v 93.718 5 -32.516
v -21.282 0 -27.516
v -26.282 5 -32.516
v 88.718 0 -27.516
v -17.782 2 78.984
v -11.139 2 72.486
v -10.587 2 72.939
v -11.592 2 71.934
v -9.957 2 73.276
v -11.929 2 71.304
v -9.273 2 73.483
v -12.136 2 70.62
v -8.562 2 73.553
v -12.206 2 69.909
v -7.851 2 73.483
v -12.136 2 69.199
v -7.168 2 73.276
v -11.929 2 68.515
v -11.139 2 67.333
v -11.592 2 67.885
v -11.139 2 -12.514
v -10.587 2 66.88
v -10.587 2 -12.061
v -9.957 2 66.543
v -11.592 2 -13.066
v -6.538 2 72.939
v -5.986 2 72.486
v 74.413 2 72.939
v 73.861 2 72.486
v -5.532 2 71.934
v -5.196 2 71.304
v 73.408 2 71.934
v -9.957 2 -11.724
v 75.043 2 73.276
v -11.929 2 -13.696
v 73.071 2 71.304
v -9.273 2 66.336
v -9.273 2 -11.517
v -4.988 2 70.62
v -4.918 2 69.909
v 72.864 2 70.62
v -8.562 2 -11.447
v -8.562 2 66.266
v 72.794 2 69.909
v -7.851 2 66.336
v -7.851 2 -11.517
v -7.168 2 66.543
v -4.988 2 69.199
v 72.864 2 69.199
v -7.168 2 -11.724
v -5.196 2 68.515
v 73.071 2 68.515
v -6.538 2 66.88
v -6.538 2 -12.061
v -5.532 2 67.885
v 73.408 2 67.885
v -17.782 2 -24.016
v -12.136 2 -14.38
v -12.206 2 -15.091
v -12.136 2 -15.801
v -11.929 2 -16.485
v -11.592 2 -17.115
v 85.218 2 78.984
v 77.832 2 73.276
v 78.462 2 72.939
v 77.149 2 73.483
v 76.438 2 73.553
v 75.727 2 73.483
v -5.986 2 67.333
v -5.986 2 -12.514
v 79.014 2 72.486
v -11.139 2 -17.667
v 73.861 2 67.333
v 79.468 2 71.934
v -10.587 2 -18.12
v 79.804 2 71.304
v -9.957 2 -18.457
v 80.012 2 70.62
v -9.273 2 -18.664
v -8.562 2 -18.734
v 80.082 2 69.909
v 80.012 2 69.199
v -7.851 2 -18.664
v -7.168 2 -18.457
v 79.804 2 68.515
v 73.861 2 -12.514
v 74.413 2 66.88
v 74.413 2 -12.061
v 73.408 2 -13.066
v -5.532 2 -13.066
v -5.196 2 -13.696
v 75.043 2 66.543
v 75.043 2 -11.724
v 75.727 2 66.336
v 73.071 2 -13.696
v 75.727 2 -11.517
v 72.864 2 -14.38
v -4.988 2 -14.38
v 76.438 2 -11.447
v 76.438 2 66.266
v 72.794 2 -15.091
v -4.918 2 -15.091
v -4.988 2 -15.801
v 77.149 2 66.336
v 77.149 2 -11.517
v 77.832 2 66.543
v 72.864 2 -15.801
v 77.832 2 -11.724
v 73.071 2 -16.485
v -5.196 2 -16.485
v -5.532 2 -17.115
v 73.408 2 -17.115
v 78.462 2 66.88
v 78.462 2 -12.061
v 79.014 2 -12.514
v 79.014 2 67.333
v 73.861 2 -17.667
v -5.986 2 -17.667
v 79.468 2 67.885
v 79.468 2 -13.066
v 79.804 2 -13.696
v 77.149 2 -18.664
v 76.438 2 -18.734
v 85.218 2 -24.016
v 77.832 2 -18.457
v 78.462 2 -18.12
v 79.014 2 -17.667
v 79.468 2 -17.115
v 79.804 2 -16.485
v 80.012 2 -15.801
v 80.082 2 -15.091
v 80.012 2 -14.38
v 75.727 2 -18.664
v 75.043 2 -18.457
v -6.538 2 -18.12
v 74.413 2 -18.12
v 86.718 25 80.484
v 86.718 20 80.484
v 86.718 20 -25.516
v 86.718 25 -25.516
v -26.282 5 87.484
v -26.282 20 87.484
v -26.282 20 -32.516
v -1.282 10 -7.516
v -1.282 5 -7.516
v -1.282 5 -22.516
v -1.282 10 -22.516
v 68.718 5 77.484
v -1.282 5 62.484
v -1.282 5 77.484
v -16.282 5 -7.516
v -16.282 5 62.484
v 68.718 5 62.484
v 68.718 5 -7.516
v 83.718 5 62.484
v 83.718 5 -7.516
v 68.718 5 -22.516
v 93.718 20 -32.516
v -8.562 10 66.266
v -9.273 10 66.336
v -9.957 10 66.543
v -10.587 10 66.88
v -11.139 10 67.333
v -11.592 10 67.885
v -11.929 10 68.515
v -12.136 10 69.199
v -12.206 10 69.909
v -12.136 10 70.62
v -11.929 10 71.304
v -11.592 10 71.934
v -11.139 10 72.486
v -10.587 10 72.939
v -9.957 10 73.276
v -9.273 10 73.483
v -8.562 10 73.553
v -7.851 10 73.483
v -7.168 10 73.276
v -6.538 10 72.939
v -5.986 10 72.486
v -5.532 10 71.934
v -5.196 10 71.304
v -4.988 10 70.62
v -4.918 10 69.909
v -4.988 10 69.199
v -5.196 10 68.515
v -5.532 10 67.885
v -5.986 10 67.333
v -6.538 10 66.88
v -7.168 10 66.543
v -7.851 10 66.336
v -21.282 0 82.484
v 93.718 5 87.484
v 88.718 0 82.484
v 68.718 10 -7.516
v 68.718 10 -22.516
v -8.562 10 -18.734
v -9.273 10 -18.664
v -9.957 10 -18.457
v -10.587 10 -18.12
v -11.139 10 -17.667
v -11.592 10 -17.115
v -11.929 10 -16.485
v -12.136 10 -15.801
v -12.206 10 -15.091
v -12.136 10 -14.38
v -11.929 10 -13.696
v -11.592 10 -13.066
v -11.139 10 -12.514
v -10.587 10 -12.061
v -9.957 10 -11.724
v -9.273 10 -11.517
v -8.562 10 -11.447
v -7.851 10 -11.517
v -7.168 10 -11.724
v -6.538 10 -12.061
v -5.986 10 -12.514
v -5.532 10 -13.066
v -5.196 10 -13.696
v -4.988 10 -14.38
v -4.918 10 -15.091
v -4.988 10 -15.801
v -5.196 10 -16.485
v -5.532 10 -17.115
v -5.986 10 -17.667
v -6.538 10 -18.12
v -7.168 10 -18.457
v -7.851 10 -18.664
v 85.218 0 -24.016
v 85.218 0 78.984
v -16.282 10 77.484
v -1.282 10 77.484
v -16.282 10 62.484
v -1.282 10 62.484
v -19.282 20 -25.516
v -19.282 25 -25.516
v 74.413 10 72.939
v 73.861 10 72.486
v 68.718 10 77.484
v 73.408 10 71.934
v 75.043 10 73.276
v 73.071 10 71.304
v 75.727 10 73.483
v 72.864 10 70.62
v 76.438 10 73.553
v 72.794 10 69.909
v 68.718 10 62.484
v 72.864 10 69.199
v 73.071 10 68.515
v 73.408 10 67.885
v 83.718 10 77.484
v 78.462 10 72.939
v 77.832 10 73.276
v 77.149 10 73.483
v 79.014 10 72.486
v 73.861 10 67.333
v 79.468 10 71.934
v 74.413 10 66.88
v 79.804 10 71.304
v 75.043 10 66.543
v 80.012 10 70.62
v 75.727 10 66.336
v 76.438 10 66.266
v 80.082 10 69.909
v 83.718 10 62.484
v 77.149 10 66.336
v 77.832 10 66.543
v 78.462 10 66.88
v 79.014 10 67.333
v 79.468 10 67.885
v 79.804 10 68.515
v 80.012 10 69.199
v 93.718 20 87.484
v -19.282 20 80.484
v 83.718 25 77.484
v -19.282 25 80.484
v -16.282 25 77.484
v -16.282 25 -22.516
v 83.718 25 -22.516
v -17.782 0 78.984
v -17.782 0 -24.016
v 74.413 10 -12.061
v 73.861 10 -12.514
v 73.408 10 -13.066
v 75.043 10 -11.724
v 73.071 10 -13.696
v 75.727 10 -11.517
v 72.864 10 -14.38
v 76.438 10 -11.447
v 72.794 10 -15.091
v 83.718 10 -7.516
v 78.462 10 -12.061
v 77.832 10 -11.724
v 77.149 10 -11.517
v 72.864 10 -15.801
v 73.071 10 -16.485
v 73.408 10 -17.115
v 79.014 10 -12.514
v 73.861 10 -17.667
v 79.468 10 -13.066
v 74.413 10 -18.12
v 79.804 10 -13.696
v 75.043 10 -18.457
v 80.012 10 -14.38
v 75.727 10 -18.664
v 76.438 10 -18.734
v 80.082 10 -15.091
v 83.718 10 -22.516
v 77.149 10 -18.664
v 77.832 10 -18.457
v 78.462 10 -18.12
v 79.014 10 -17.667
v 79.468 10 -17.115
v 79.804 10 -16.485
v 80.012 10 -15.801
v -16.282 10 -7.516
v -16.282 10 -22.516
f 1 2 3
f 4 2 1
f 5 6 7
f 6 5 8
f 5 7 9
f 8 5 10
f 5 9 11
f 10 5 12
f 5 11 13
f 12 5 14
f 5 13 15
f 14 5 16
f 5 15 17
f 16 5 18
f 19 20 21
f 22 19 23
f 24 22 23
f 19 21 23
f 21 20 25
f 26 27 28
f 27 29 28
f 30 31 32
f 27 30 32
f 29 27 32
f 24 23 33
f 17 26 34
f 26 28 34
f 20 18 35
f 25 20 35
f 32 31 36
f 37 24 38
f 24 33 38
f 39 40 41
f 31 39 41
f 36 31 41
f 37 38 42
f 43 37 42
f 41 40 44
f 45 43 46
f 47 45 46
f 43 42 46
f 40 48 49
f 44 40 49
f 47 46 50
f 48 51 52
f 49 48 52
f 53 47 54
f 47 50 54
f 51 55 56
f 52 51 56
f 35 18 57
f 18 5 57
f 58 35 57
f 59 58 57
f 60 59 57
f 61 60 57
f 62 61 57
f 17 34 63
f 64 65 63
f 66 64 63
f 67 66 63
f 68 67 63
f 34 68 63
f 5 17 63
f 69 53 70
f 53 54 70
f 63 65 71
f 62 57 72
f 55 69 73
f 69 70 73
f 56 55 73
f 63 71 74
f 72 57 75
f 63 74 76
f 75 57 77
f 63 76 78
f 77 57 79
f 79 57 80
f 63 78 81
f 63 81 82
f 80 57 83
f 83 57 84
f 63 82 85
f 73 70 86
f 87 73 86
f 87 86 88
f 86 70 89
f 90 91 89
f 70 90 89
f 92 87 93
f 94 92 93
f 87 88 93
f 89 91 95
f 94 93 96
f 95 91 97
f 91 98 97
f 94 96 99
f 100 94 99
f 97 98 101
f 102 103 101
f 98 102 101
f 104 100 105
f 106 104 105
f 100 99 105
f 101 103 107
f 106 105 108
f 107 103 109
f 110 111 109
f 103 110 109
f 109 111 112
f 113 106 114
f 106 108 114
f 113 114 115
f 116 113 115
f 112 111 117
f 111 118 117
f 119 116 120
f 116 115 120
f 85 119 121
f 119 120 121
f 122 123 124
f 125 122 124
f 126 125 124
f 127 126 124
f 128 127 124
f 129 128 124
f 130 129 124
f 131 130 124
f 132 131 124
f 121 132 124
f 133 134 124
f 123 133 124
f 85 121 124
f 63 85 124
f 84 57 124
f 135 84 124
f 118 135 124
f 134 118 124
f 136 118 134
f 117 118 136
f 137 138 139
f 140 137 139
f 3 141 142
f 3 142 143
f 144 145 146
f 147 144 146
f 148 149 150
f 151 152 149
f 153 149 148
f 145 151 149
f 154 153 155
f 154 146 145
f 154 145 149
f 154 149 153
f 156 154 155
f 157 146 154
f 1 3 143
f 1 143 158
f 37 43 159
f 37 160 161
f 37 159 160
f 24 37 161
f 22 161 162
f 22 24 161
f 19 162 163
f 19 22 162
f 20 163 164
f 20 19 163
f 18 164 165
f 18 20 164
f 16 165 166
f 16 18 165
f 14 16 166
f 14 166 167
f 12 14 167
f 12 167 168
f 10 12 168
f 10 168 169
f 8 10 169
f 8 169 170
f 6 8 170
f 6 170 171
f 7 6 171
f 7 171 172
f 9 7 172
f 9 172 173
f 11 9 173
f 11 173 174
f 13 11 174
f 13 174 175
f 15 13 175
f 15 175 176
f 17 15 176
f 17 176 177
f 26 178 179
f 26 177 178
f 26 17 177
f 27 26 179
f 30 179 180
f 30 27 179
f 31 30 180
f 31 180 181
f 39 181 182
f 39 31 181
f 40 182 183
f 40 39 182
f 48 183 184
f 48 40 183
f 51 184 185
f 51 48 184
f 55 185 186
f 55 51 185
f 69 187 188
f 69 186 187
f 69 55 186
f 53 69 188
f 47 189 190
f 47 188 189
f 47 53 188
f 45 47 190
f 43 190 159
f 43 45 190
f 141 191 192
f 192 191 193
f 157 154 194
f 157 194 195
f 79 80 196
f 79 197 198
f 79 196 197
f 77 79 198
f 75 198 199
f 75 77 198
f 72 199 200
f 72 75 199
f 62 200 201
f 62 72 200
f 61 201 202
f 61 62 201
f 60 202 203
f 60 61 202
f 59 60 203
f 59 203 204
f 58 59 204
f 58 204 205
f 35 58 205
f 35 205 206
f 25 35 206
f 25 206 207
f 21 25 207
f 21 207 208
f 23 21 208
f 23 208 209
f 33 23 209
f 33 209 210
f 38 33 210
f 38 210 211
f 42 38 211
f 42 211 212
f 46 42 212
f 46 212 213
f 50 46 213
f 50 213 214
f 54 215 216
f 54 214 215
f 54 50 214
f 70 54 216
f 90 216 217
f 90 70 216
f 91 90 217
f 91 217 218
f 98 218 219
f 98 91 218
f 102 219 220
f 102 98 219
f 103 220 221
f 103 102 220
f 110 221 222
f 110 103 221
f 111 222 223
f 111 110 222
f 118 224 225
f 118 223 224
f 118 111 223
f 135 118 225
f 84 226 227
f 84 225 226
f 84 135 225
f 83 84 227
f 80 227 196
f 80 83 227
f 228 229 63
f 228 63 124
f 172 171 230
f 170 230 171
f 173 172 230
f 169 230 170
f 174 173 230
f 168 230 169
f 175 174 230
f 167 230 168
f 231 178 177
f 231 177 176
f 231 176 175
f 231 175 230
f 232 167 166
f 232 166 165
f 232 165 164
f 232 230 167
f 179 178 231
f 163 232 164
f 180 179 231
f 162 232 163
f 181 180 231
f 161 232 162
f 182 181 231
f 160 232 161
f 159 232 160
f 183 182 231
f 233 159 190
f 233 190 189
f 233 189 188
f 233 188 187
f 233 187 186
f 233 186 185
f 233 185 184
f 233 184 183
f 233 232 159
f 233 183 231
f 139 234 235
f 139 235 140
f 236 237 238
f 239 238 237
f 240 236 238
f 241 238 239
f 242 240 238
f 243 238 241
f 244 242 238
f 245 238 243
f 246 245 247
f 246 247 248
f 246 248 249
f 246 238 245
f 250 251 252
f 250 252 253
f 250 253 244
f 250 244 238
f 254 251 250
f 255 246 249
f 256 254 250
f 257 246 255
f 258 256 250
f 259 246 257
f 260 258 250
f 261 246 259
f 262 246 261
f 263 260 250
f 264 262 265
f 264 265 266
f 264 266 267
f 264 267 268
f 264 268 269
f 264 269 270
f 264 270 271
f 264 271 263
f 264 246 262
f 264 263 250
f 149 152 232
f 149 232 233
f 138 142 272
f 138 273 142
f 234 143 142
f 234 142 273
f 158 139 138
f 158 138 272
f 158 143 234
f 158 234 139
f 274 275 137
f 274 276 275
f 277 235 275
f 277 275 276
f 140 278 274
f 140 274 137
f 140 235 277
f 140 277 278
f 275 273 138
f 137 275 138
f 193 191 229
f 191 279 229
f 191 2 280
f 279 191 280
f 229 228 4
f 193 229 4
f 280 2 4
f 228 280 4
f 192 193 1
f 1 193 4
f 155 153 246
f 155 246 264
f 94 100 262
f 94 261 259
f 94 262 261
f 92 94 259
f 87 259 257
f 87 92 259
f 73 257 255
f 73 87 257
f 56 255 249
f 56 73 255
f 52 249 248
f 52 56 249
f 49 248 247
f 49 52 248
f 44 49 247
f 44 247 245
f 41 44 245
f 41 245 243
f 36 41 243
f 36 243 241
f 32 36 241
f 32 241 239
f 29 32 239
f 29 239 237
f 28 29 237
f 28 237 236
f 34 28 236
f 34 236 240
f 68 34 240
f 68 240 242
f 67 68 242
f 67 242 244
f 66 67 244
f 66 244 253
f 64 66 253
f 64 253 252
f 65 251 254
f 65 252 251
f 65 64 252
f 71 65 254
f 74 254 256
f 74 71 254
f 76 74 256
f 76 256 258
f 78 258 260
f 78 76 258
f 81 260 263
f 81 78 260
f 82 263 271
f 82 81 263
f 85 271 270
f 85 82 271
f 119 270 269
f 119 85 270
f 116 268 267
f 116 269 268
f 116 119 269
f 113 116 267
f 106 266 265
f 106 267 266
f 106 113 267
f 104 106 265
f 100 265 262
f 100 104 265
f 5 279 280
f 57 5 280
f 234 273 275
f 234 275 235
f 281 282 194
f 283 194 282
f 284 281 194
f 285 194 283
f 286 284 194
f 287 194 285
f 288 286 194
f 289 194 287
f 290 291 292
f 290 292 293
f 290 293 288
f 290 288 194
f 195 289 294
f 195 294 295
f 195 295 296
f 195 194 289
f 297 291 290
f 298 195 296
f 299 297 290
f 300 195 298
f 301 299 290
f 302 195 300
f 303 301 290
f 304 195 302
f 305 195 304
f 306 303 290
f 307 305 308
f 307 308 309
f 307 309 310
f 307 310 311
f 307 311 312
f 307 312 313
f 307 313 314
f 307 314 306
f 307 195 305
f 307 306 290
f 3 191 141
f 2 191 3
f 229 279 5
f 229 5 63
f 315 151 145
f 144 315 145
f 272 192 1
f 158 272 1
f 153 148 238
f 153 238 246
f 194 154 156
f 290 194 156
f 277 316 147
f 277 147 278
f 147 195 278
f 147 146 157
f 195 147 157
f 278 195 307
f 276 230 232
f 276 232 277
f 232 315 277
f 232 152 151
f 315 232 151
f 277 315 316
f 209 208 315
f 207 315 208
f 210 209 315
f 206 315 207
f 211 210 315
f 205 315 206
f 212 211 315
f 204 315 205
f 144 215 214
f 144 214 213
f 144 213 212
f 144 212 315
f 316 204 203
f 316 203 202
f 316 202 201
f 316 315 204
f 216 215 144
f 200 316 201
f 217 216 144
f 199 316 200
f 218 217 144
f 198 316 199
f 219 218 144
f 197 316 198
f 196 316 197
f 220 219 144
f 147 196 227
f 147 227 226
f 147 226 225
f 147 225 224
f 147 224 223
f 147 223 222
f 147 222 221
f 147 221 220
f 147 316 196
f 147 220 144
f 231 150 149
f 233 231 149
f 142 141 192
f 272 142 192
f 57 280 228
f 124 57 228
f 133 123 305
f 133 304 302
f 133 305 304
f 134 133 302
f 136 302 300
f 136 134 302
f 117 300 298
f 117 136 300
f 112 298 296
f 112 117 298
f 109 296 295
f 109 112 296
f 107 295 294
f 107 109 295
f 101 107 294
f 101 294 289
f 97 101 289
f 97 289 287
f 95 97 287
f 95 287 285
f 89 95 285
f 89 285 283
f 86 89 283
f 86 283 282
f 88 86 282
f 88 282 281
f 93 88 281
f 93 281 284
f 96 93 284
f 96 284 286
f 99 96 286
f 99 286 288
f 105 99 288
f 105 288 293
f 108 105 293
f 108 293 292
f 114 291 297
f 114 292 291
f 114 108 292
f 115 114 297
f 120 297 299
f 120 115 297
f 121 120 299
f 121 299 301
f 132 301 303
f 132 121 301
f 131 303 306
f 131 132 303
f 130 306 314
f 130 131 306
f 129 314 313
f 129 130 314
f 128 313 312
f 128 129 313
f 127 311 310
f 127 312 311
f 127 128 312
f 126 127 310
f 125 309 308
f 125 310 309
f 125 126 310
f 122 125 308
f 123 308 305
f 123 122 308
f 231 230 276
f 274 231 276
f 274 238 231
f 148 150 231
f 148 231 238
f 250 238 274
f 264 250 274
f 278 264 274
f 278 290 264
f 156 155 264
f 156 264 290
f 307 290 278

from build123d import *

# Parameters (mm, degrees)
SKETCH1_W               = 120
SKETCH1_H               = 120
SKETCH1_W_2             = 106
SKETCH1_H_2             = 106
BOSS_EXTRUDE1_DEPTH     = 20
SKETCH1_4_W             = 106
SKETCH1_4_H             = 106
SKETCH1_4_W_2           = 100
SKETCH1_4_H_2           = 100
BOSS_EXTRUDE2_DEPTH     = 25
SKETCH1_5_W             = 100
SKETCH1_5_H             = 100
BOSS_EXTRUDE3_DEPTH     = 5
SKETCH1_7_W             = 103
SKETCH1_7_H             = 103
CUT_EXTRUDE1_DEPTH      = 2
SKETCH2_W               = 15
SKETCH2_H               = 15
BOSS_EXTRUDE5_DEPTH     = 5
CUT_EXTRUDE7_DEPTH      = 112
CUT_EXTRUDE7_DEPTH_BACK = 130.755311173
SKETCH8_R               = 3.643912303
CHAMFER1_SIZE           = 5


with BuildPart() as part:
    # Sketch1 → Boss-Extrude1 (new body)
    with BuildSketch(Plane(origin=(0, 0, 0), x_dir=(1, 0, 0), z_dir=(0, 1, 0))):
        with Locations((33.717730969, -27.483870968)):
            Rectangle(SKETCH1_W, SKETCH1_H)
        with Locations((33.717730969, -27.483870968)):
            Rectangle(SKETCH1_W_2, SKETCH1_H_2, mode=Mode.SUBTRACT)
    extrude(amount=BOSS_EXTRUDE1_DEPTH)

    # Sketch1<4> → Boss-Extrude2 (add)
    with BuildSketch(Plane(origin=(0, 0, 0), x_dir=(1, 0, 0), z_dir=(0, 1, 0))):
        with Locations((33.717730969, -27.483870968)):
            Rectangle(SKETCH1_4_W, SKETCH1_4_H)
        with Locations((33.717730969, -27.483870968)):
            Rectangle(SKETCH1_4_W_2, SKETCH1_4_H_2, mode=Mode.SUBTRACT)
    extrude(amount=BOSS_EXTRUDE2_DEPTH)

    # Sketch1<5> → Boss-Extrude3 (add)
    with BuildSketch(Plane(origin=(0, 0, 0), x_dir=(1, 0, 0), z_dir=(0, 1, 0))):
        with Locations((33.717730969, -27.483870968)):
            Rectangle(SKETCH1_5_W, SKETCH1_5_H)
    extrude(amount=BOSS_EXTRUDE3_DEPTH)

    # Sketch1<7> → Cut-Extrude1 (cut)
    with BuildSketch(Plane(origin=(0, 0, 0), x_dir=(1, 0, 0), z_dir=(0, 1, 0))):
        with Locations((33.717730969, -27.483870968)):
            Rectangle(SKETCH1_7_W, SKETCH1_7_H)
    extrude(amount=CUT_EXTRUDE1_DEPTH, mode=Mode.SUBTRACT)

    # Sketch2 → Boss-Extrude5 (add)
    with BuildSketch(Plane(origin=(0, 5, 0), x_dir=(1, 0, 0), z_dir=(0, 1, 0))):
        with Locations((76.217730969, 15.016129032)):
            Rectangle(SKETCH2_W, SKETCH2_H)
        with Locations((-8.782269031, 15.016129032)):
            Rectangle(SKETCH2_W, SKETCH2_H)
        with Locations((-8.782269031, -69.983870968)):
            Rectangle(SKETCH2_W, SKETCH2_H)
        with Locations((76.217730969, -69.983870968)):
            Rectangle(SKETCH2_W, SKETCH2_H)
    extrude(amount=BOSS_EXTRUDE5_DEPTH)

    # Sketch8 → Cut-Extrude7 (cut, two sides: drawn at the far end of the back side and taken through both)
    with BuildSketch(Plane(origin=(0, 5, 0), x_dir=(1, 0, 0), z_dir=(0, 1, 0)).offset(-CUT_EXTRUDE7_DEPTH_BACK)):
        with Locations((-8.562175079, 15.090544671)):
            Circle(SKETCH8_R)
        with Locations((76.437824921, 15.090544671)):
            Circle(SKETCH8_R)
        with Locations((-8.562175079, -69.909455329)):
            Circle(SKETCH8_R)
        with Locations((76.437824921, -69.909455329)):
            Circle(SKETCH8_R)
    extrude(amount=CUT_EXTRUDE7_DEPTH + CUT_EXTRUDE7_DEPTH_BACK, mode=Mode.SUBTRACT)

    # Chamfer1
    chamfer1_edges = [part.edges().sort_by_distance(p)[0] for p in [
        (-26.282269031, 0, 27.483870968),
        (33.717730969, 0, 87.483870968),
        (93.717730969, 0, 27.483870968),
        (33.717730969, 0, -32.516129032),
    ]]
    chamfer(chamfer1_edges, length=CHAMFER1_SIZE)


solid = part.part
